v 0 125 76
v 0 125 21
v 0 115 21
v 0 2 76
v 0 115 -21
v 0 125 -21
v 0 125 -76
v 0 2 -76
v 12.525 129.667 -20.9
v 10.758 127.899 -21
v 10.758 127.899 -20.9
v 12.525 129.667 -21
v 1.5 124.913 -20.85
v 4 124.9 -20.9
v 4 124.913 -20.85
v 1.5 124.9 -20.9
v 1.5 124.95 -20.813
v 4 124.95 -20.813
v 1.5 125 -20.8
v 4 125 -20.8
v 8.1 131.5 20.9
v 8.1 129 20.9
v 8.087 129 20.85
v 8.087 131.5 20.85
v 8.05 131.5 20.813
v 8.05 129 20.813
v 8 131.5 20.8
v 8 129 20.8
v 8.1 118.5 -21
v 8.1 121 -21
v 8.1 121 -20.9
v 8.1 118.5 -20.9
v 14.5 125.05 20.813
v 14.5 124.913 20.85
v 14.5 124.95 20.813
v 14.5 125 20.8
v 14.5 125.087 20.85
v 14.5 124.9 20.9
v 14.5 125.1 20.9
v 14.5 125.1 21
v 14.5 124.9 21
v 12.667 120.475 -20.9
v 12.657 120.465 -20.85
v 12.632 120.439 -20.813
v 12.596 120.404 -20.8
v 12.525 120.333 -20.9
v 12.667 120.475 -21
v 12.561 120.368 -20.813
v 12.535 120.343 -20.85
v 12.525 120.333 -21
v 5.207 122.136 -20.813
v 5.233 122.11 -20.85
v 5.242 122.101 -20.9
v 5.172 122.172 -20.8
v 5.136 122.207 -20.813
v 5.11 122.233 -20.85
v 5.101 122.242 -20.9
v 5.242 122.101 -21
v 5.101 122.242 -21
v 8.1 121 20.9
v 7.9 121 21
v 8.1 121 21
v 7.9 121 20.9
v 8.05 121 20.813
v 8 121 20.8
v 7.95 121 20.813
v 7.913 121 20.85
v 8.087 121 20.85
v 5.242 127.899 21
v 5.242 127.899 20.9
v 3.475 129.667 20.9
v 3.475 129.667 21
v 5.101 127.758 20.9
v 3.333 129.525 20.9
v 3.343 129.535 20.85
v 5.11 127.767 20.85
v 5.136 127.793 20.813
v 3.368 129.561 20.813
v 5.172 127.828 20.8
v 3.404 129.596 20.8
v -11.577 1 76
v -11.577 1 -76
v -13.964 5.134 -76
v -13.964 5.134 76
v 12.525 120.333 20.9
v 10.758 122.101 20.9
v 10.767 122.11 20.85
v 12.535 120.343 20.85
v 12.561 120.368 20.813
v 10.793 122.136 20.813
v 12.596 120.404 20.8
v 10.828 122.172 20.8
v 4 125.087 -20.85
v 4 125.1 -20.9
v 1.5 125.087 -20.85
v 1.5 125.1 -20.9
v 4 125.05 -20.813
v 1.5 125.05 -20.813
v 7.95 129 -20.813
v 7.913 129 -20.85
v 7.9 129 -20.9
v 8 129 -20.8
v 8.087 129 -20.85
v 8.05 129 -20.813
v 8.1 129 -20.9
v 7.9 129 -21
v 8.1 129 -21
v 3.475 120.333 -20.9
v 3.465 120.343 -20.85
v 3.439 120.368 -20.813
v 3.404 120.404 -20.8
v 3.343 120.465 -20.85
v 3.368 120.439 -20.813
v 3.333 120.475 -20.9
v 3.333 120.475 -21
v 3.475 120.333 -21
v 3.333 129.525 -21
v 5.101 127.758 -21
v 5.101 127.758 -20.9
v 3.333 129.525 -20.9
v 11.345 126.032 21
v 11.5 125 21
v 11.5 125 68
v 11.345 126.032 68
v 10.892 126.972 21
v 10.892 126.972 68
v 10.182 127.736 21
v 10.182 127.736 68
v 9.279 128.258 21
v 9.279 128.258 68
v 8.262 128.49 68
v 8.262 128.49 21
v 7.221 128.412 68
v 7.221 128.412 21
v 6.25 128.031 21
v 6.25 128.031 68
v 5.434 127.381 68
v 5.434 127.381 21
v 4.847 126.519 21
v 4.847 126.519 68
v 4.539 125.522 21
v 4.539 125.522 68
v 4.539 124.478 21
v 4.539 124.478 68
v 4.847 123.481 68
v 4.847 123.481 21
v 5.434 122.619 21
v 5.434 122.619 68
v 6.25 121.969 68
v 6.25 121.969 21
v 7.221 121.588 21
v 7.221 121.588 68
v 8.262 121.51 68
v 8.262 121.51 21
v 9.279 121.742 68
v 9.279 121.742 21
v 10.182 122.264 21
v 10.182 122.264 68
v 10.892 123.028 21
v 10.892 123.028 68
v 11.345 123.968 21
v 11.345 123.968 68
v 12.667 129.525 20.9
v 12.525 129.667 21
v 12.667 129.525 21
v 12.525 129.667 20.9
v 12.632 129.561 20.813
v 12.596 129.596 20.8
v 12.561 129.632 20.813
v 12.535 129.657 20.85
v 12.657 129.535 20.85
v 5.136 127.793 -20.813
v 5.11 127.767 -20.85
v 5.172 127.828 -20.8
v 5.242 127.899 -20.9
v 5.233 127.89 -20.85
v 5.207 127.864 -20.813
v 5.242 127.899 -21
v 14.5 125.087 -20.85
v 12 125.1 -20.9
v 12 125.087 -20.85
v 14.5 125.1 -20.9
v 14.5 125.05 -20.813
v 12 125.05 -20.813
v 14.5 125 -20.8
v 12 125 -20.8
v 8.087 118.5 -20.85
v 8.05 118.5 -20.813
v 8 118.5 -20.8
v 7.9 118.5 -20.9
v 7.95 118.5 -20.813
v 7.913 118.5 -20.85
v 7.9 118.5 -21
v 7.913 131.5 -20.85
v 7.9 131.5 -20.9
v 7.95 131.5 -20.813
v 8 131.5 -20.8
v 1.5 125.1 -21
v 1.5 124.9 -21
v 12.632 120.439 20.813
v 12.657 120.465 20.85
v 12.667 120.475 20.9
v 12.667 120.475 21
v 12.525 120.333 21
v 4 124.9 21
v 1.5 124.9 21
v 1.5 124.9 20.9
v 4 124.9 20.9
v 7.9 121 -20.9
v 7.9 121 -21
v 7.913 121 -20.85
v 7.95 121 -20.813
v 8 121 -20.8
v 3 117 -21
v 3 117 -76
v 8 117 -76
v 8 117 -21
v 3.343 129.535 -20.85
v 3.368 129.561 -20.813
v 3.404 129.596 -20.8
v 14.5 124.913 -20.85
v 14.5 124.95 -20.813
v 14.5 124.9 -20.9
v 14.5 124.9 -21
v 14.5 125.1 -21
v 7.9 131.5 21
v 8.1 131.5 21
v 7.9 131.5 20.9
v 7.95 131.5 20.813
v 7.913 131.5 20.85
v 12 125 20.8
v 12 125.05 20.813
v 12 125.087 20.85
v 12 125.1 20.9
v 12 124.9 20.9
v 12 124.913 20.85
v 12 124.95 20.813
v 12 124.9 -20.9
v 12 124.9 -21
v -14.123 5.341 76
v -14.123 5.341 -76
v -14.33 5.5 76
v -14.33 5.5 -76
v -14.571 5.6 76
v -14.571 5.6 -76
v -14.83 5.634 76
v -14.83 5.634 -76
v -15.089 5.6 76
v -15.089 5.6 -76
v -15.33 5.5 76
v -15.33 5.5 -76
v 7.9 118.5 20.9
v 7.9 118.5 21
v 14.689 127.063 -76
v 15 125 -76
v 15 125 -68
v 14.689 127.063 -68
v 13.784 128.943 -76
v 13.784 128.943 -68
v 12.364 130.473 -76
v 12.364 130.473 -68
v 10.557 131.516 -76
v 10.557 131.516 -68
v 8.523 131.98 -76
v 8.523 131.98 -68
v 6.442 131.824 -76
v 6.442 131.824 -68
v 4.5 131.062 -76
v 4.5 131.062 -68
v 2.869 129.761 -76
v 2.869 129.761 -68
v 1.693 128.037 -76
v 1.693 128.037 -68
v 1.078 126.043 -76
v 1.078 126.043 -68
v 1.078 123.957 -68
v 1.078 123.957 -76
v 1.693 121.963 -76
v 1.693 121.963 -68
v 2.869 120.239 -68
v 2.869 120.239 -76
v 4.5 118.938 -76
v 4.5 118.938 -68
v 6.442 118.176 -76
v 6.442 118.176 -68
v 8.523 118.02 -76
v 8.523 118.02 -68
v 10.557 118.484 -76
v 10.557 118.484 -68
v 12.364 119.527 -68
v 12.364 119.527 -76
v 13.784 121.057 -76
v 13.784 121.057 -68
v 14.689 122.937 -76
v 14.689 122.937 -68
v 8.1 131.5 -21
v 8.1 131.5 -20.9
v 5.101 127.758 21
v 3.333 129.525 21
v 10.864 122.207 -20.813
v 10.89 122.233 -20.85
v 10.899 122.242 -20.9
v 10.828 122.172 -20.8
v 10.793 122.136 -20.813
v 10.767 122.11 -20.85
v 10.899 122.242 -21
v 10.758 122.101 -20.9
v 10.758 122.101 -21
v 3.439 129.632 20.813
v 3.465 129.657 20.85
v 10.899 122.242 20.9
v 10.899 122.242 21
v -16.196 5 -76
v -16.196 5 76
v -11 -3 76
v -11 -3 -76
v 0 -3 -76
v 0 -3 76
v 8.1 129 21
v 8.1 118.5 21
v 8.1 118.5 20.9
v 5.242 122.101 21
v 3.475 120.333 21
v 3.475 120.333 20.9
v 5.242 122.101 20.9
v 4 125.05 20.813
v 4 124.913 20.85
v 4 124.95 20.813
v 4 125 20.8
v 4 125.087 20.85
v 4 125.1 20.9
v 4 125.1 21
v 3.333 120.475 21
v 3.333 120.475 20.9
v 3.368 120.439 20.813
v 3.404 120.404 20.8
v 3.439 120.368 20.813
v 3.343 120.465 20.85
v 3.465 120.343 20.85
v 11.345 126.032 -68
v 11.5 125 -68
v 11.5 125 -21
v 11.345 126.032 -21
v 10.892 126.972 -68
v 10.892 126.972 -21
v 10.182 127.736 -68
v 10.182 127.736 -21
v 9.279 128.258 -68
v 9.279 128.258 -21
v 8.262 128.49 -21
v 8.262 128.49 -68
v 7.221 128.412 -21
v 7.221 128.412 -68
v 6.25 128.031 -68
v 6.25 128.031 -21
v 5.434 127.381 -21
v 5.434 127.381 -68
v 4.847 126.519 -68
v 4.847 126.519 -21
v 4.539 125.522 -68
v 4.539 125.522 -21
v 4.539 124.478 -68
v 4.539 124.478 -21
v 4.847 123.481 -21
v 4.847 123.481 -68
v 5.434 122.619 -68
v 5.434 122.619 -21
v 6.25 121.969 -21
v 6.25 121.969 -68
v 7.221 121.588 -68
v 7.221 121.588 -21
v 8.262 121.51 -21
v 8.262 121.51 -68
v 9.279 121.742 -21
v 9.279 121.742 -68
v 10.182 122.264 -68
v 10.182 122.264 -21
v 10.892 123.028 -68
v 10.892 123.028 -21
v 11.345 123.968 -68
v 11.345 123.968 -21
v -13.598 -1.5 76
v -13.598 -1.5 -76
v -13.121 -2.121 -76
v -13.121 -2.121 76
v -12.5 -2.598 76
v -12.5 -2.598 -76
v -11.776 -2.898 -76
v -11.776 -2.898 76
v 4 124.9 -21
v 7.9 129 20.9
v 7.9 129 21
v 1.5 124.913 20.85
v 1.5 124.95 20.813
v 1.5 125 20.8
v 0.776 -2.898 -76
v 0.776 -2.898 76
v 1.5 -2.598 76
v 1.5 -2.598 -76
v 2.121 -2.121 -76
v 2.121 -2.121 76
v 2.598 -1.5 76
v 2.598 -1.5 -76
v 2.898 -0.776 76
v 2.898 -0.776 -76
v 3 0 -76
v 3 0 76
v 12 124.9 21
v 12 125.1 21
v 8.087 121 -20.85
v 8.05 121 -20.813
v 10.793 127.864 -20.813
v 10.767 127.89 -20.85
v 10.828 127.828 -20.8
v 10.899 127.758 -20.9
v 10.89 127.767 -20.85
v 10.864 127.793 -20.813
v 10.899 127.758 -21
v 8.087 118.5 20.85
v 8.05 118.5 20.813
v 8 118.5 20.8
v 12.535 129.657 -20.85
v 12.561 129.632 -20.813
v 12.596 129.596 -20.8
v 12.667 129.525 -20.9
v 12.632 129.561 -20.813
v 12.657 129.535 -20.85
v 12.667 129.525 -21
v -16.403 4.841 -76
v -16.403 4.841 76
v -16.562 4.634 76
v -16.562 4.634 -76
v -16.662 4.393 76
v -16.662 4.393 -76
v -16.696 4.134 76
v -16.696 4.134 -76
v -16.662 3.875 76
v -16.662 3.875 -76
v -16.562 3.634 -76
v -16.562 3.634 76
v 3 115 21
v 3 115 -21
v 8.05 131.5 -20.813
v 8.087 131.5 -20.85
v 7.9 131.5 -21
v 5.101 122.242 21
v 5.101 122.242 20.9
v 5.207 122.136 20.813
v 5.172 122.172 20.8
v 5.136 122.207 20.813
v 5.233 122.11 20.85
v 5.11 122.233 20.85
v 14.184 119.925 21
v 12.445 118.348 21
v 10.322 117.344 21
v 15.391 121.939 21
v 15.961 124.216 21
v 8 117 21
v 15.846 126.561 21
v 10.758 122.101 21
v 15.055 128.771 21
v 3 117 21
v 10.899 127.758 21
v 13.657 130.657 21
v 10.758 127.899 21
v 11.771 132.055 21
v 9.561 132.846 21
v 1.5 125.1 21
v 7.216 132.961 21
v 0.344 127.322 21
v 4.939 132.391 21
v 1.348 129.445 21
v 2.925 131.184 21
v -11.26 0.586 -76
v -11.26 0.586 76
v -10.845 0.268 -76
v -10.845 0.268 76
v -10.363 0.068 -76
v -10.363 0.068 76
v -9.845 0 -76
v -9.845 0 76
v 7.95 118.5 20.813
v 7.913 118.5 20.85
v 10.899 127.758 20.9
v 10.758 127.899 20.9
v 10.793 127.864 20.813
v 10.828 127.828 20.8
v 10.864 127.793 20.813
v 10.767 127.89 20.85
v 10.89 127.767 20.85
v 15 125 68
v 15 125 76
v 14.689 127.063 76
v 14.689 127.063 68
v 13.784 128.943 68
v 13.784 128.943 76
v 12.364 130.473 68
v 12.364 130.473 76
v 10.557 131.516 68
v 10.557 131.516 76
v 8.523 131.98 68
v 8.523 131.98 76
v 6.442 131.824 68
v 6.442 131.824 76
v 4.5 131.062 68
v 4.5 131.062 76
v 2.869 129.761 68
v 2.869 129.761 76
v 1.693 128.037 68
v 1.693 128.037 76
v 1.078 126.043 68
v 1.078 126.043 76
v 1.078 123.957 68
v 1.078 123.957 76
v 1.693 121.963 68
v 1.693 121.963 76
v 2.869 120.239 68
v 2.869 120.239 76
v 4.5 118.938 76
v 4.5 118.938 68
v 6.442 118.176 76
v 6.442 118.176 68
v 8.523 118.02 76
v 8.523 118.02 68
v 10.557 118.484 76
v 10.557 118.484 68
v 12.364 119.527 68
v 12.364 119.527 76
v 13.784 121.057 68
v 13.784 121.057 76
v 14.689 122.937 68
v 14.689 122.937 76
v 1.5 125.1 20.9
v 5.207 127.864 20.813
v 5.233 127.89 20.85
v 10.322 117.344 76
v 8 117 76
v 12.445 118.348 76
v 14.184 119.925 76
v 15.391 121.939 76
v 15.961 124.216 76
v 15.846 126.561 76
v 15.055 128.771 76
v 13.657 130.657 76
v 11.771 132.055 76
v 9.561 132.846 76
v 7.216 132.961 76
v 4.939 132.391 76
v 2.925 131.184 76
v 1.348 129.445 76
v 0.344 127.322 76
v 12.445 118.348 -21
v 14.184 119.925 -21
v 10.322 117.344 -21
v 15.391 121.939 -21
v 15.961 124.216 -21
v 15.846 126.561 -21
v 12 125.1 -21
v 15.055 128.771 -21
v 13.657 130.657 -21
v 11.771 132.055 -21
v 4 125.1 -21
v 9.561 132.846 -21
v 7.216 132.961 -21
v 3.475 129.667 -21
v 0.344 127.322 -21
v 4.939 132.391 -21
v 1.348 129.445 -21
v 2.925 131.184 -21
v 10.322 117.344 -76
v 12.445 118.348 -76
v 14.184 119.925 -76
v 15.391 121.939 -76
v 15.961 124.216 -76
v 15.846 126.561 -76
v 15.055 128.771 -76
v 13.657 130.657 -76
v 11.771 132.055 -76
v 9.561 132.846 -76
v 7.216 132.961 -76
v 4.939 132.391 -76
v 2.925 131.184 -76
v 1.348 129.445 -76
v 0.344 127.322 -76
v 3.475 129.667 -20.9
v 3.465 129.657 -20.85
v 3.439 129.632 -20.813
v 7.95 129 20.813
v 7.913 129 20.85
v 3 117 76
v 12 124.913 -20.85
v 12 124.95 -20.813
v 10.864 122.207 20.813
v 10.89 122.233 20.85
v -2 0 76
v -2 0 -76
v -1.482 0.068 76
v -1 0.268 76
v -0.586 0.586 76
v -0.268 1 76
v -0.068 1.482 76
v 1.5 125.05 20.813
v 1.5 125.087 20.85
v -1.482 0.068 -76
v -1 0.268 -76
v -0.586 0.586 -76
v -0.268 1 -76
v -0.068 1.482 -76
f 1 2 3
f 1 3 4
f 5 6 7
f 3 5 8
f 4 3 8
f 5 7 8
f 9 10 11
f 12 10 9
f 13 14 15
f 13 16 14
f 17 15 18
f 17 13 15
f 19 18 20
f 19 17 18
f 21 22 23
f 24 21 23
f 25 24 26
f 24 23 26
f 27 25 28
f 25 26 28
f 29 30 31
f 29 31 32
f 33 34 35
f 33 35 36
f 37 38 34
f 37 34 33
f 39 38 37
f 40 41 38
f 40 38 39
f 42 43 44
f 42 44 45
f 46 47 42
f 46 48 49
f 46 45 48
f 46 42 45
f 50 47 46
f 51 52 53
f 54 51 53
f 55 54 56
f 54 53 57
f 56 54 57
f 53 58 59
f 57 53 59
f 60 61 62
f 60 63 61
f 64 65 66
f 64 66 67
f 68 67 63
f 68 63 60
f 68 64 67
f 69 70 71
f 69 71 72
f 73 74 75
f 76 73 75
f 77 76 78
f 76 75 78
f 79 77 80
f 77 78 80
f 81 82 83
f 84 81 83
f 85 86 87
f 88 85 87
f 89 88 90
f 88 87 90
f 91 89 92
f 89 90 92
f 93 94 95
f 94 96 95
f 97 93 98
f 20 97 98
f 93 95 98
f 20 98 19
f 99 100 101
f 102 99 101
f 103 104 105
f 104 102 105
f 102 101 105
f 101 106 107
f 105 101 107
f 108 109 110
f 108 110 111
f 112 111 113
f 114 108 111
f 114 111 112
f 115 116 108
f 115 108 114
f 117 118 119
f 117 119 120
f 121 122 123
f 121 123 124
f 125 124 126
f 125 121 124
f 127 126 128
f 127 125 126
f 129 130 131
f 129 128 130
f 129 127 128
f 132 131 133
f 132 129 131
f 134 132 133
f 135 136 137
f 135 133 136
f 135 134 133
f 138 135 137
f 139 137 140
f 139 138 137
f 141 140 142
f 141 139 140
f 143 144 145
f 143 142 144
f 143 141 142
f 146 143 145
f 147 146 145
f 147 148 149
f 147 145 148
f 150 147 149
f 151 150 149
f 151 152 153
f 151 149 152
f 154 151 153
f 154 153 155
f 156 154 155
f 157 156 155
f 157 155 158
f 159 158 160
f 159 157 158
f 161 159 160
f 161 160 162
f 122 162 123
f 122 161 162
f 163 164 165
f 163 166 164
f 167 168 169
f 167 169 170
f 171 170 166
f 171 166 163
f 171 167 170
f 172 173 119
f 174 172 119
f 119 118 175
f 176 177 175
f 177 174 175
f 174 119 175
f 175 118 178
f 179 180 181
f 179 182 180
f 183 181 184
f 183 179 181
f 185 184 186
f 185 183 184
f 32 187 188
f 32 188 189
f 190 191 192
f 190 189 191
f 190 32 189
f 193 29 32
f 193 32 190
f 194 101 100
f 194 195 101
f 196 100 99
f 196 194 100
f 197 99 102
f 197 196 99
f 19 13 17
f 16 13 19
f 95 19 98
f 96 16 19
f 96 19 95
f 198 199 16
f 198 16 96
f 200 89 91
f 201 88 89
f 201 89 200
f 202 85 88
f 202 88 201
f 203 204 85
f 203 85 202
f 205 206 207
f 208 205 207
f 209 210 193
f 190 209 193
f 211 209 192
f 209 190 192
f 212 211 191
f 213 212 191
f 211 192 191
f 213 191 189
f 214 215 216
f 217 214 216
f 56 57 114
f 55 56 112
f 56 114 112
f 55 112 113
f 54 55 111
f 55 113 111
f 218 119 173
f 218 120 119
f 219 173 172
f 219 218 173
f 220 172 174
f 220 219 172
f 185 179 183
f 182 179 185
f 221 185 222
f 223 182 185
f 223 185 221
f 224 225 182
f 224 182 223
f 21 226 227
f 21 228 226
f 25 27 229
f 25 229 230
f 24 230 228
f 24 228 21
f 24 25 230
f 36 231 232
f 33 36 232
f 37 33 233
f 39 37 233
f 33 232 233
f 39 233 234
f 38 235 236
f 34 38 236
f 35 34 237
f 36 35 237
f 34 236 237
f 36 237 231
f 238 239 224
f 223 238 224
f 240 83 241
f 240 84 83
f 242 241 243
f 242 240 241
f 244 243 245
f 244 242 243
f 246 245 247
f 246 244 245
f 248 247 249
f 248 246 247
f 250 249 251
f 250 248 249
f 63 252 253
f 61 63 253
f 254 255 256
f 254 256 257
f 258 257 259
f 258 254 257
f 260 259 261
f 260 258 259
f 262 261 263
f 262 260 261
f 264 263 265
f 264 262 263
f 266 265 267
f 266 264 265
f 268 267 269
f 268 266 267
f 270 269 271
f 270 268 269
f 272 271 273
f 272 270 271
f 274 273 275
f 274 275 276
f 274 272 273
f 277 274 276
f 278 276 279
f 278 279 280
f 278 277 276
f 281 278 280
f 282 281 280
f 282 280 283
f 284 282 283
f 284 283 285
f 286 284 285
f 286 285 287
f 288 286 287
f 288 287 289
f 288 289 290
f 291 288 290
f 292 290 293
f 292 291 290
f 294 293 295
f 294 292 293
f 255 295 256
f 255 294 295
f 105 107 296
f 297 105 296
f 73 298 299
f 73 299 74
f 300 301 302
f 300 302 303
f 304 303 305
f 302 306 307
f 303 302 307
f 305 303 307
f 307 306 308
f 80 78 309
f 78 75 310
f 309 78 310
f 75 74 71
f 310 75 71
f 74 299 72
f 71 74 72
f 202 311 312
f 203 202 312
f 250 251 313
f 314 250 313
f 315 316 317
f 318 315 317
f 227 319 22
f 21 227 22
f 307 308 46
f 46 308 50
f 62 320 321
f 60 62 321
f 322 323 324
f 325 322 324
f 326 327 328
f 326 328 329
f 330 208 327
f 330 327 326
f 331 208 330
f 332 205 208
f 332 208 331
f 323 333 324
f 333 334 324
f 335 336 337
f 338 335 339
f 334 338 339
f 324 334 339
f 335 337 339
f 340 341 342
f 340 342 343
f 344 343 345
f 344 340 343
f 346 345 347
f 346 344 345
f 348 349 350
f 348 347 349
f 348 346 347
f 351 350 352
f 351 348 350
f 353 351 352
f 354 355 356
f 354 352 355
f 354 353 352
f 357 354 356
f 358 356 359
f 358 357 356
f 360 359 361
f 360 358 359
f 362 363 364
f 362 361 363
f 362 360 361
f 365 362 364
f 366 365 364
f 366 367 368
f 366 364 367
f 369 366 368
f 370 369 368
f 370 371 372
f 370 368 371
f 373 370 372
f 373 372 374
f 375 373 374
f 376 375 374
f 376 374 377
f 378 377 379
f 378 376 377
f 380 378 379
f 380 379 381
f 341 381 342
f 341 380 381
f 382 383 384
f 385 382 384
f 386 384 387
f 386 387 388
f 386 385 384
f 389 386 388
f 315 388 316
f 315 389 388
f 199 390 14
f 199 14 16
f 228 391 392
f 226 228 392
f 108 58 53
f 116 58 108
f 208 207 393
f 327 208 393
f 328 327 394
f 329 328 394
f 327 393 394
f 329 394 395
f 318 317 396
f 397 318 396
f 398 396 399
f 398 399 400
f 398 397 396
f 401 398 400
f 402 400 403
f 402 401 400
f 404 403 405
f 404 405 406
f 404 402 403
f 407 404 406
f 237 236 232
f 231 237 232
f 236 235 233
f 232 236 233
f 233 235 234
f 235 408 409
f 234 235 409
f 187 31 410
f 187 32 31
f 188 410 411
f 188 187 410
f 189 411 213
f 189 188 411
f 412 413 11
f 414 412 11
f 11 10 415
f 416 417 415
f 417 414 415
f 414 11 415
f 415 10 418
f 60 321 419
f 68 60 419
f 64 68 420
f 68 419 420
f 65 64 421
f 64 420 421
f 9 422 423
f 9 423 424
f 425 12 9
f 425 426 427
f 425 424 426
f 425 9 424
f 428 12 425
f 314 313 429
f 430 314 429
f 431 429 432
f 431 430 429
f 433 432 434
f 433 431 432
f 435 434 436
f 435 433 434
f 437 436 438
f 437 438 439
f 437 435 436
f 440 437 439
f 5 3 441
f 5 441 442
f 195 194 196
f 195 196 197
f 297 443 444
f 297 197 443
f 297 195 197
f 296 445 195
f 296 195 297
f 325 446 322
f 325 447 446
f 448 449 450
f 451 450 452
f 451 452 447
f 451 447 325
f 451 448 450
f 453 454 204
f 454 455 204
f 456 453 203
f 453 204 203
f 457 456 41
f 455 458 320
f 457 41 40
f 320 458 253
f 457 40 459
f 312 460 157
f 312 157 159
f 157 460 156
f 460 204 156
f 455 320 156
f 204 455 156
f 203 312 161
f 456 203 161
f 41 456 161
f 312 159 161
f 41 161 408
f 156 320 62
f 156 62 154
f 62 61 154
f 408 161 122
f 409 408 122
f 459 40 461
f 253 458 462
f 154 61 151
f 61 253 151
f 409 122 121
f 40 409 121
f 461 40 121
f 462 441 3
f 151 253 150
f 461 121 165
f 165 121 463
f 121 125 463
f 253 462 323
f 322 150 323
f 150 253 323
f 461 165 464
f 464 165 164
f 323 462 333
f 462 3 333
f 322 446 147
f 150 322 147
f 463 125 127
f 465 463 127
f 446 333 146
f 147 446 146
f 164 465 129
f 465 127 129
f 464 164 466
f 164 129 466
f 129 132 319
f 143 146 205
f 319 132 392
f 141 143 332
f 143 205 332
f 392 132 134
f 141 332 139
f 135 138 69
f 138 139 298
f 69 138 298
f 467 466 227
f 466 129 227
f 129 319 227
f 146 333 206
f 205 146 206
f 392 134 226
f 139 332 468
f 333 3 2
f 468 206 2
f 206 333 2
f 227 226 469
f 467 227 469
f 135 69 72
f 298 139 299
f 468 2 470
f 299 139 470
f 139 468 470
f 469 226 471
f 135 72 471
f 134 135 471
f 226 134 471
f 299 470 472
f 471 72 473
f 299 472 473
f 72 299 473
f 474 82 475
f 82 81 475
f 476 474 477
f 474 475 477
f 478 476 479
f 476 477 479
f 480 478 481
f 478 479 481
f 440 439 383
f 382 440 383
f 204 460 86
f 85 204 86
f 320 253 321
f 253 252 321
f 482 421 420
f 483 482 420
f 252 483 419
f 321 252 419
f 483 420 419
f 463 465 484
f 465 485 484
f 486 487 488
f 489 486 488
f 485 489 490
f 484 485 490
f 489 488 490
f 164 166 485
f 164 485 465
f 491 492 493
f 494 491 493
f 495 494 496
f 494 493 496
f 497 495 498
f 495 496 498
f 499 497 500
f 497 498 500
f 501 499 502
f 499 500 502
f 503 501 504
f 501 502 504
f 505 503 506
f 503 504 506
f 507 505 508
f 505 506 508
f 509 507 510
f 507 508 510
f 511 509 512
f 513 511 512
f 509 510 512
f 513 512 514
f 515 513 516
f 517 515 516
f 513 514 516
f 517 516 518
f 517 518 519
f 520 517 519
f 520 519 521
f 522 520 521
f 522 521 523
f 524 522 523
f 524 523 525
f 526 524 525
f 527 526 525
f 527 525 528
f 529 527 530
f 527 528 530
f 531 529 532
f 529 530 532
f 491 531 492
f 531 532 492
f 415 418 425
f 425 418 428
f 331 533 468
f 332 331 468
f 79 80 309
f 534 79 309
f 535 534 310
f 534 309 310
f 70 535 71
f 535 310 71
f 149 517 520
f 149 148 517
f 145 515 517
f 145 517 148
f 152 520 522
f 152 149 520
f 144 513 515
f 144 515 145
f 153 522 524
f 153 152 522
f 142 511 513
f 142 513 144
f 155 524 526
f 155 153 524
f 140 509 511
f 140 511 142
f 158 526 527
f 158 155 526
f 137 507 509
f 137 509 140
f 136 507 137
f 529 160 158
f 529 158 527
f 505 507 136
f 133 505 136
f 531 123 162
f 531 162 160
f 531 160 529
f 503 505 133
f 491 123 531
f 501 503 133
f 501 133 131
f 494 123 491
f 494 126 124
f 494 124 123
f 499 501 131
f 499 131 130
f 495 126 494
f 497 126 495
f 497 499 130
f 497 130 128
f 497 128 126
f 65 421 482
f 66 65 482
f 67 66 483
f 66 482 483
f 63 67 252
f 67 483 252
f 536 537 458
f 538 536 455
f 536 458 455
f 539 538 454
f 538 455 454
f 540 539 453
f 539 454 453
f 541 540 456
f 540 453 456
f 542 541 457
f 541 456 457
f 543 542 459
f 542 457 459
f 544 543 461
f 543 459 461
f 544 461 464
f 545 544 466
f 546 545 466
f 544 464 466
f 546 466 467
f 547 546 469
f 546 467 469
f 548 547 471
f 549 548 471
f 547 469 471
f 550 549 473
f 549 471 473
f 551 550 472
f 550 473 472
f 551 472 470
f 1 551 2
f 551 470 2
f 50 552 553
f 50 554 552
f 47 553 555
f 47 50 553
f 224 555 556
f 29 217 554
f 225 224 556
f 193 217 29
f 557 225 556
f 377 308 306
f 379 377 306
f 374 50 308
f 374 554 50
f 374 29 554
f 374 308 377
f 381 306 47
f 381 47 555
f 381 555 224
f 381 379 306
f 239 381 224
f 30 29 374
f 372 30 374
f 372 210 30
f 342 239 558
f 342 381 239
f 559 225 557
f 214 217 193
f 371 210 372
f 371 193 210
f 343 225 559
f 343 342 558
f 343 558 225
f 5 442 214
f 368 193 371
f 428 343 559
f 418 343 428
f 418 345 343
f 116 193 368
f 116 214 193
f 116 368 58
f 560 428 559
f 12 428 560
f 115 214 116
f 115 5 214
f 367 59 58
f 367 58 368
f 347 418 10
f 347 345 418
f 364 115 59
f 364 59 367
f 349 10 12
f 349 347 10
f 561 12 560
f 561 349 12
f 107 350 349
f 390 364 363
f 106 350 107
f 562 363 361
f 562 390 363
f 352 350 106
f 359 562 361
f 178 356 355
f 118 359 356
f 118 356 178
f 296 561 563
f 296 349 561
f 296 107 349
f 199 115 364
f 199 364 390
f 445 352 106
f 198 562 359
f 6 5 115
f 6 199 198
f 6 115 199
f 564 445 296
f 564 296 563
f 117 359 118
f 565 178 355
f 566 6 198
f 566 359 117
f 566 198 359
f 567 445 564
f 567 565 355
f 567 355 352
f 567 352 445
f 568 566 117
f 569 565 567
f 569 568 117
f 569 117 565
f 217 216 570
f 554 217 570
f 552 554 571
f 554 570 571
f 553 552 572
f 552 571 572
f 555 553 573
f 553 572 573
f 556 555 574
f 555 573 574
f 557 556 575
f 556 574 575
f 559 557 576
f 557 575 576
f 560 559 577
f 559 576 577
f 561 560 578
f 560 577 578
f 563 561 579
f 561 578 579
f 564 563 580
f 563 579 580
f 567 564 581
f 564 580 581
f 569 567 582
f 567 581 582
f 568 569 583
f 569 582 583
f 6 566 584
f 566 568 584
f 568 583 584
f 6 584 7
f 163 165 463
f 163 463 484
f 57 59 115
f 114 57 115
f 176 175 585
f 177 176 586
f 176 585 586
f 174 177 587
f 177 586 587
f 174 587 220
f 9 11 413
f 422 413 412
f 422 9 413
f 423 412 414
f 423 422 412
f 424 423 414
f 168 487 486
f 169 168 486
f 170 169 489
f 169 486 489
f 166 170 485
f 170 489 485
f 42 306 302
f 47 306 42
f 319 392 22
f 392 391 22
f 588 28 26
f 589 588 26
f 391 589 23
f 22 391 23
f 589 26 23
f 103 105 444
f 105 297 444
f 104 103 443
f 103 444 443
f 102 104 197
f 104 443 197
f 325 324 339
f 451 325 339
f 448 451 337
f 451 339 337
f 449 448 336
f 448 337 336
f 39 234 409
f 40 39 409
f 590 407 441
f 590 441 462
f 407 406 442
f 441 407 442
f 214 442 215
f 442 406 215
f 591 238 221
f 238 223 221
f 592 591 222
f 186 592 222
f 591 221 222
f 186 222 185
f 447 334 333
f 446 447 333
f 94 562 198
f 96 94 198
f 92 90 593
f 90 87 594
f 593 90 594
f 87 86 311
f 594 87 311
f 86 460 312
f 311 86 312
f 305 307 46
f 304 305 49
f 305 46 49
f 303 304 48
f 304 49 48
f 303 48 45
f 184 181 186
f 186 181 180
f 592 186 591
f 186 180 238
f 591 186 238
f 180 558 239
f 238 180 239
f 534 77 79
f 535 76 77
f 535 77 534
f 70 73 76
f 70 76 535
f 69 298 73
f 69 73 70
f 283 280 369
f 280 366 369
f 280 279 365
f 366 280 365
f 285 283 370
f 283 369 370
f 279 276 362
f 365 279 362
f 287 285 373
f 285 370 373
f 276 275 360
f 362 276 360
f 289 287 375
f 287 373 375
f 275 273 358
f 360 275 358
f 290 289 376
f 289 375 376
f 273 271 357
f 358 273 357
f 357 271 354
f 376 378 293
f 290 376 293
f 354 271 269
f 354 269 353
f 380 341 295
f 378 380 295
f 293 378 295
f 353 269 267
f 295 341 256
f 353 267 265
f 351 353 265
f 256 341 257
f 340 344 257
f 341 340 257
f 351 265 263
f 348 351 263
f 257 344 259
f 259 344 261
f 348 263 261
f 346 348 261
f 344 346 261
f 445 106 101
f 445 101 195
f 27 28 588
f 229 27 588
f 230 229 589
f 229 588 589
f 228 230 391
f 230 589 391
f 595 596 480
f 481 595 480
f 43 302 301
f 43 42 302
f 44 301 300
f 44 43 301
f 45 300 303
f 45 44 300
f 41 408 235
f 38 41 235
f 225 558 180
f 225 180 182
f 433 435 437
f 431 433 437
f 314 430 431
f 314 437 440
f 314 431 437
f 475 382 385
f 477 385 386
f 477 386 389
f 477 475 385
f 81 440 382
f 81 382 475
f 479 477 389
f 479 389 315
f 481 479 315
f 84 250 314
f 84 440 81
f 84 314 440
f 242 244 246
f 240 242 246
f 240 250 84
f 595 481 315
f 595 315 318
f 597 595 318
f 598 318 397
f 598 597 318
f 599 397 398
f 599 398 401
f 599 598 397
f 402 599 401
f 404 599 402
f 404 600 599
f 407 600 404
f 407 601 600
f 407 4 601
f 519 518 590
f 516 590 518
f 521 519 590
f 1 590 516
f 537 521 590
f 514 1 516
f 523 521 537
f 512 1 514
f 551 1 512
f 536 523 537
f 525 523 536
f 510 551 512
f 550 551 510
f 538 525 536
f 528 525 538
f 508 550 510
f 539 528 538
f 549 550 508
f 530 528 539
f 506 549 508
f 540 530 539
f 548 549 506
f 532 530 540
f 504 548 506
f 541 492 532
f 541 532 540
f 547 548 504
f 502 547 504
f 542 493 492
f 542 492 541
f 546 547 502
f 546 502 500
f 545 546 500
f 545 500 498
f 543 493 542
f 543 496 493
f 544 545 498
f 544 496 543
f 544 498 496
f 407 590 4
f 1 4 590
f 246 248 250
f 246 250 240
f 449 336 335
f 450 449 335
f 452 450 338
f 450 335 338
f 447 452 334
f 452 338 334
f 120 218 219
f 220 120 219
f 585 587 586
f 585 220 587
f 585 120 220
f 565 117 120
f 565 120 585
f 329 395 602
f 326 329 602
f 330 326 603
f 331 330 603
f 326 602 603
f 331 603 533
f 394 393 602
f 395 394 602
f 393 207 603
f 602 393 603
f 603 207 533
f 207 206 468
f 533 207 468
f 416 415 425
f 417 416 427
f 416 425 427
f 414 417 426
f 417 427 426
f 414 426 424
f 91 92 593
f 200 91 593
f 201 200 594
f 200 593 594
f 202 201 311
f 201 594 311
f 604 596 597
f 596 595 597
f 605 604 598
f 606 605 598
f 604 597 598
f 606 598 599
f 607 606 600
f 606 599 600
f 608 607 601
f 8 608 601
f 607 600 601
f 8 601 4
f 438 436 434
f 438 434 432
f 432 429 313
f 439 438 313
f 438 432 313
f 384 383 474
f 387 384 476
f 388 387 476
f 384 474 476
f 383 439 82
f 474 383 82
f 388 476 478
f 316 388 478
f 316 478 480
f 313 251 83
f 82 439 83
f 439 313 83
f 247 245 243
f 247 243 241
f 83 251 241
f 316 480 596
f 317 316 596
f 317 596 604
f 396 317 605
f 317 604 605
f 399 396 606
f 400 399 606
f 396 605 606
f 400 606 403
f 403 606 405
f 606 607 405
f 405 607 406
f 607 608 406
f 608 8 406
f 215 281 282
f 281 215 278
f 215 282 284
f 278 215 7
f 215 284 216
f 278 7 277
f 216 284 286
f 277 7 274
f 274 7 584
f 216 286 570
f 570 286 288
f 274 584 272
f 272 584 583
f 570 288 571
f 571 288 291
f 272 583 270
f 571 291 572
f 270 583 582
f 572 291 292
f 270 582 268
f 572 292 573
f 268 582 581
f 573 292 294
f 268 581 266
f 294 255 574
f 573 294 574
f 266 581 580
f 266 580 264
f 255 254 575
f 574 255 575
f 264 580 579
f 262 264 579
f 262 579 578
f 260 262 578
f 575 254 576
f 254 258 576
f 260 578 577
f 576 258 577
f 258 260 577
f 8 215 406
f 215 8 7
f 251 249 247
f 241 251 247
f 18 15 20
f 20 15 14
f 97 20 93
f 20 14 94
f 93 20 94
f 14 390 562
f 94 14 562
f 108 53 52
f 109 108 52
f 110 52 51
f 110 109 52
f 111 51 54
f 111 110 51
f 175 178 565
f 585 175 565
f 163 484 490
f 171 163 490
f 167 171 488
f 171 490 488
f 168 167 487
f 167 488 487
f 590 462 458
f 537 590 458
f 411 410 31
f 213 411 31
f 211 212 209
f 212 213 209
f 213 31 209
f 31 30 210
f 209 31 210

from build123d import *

# Parameters (mm, degrees)
BOSS_EXTRUDE1_DEPTH      = 76
BOSS_EXTRUDE1_DEPTH_BACK = 76
SKETCH2_R                = 8
FILLET1_R                = 3
FILLET2_R                = 2
FILLET3_R                = 1
CUT_EXTRUDE2_DEPTH       = 155.090108397
CUT_EXTRUDE2_DEPTH_BACK  = 155.090108397
SKETCH7_R                = 3.5
SKETCH9_R                = 7
CUT_EXTRUDE3_DEPTH       = 8
CUT_EXTRUDE4_DEPTH       = 155.090108397
CUT_EXTRUDE4_DEPTH_BACK  = 155.090108397
SKETCH10_W               = 42
SKETCH10_H               = 59.343909382
SKETCH11_W               = 0.2
SKETCH11_H               = 2.5
BOSS_EXTRUDE2_DEPTH      = 0.2
FILLET4_R                = 0.1
CIRPATTERN1_COUNT        = 8
FILLET4_OF_CIRPATTERN1_R = 0.1
MIRROR2_START            = 118.5
MIRROR2_DEPTH            = 2.5
MIRROR2_START_2          = 129
MIRROR2_2_DEPTH          = 2.5
MIRROR2_START_3          = 87.545201898
MIRROR2_3_DEPTH          = 2.5
MIRROR2_START_4          = 98.045201898
MIRROR2_4_DEPTH          = 2.5
MIRROR2_START_5          = 1.5
MIRROR2_5_DEPTH          = 2.5
MIRROR2_START_6          = 12
MIRROR2_6_DEPTH          = 2.5
MIRROR2_START_7          = -89.231493399
MIRROR2_7_DEPTH          = 2.5
MIRROR2_START_8          = -78.731493399
MIRROR2_8_DEPTH          = 2.5


# Read off the part's stored shape, not the designer's step: Mirror2
with BuildPart() as part:
    # Sketch2 → Boss-Extrude1 (new, two sides: drawn at the far end of the back side and taken through both)
    with BuildSketch(Plane.XY.offset(-BOSS_EXTRUDE1_DEPTH_BACK)):
        with Locations((8, 125)):
            Circle(SKETCH2_R)
        with BuildLine():
            ThreePointArc((8, 117), (5.350470229, 117.451490744), (3, 118.755002002))
            Line((3, 118.755002002), (3, 117))
            Line((3, 117), (8, 117))
        make_face()
        with BuildLine():
            Line((0, 125), (0, 0))
            Line((0, 0), (-11, 0))
            Line((-11, 0), (-14.464101615, 6))
            Line((-14.464101615, 6), (-17.062177826, 4.5))
            Line((-17.062177826, 4.5), (-12.732050808, -3))
            Line((-12.732050808, -3), (3, -3))
            Line((3, -3), (3, 117))
            Line((3, 117), (3, 118.755002002))
            ThreePointArc((3, 118.755002002), (0.788897449, 121.535898385), (0, 125))
        make_face()
    extrude(amount=BOSS_EXTRUDE1_DEPTH + BOSS_EXTRUDE1_DEPTH_BACK)

    # Fillet1
    fillet1_edges = [part.edges().sort_by_distance(p)[0] for p in [
        (3, -3, 0),
        (-12.732050808, -3, 0),
    ]]
    fillet(fillet1_edges, radius=FILLET1_R)

    # Fillet2
    fillet2_edges = [part.edges().sort_by_distance(p)[0] for p in [
        (-11, 0, 0),
        (0, 0, 0),
    ]]
    fillet(fillet2_edges, radius=FILLET2_R)

    # Fillet3
    fillet3_edges = [part.edges().sort_by_distance(p)[0] for p in [
        (-17.062177826, 4.5, 0),
        (-14.464101615, 6, 0),
    ]]
    fillet(fillet3_edges, radius=FILLET3_R)

    # Sketch7 → Cut-Extrude2 (cut, two sides: drawn at the far end of the back side and taken through both)
    with BuildSketch(Plane.XY.offset(-CUT_EXTRUDE2_DEPTH_BACK)):
        with Locations((8, 125)):
            Circle(SKETCH7_R)
    extrude(amount=CUT_EXTRUDE2_DEPTH + CUT_EXTRUDE2_DEPTH_BACK, mode=Mode.SUBTRACT)

    # Sketch9 → Cut-Extrude3 (cut)
    with BuildSketch(Plane.XY.offset(76)):
        with Locations((8, 125)):
            Circle(SKETCH9_R)
    cut_extrude3 = extrude(amount=-CUT_EXTRUDE3_DEPTH, mode=Mode.SUBTRACT)

    # Mirror1: Cut-Extrude3 across plane
    add(cut_extrude3.mirror(Plane.XY), mode=Mode.SUBTRACT)

    # Sketch10 → Cut-Extrude4 (cut, two sides: drawn at the far end of the back side and taken through both)
    with BuildSketch(Plane(origin=(0, 0, 0), x_dir=(0, 0, -1), z_dir=(1, 0, 0)).offset(-CUT_EXTRUDE4_DEPTH_BACK)):
        with Locations((0, 144.671954691)):
            Rectangle(SKETCH10_W, SKETCH10_H)
    extrude(amount=CUT_EXTRUDE4_DEPTH + CUT_EXTRUDE4_DEPTH_BACK, mode=Mode.SUBTRACT)

    # Sketch11 → Boss-Extrude2 (add)
    with BuildSketch(Plane.XY.offset(-21)):
        with Locations((8, 130.25)):
            Rectangle(SKETCH11_W, SKETCH11_H)
    boss_extrude2 = extrude(amount=BOSS_EXTRUDE2_DEPTH)

    # Fillet4
    fillet4_edges = [part.edges().sort_by_distance(p)[0] for p in [
        (8.1, 130.25, -20.8),
        (7.9, 130.25, -20.8),
    ]]
    fillet(fillet4_edges, radius=FILLET4_R - 0.0001)  # a hair under: the kernel refuses the full size

    # CirPattern1: Boss-Extrude2 ×8 about axis
    cirpattern1_axis = Axis((8, 125, 0), (0, 0, 1))
    for i in range(1, CIRPATTERN1_COUNT):
        add(boss_extrude2.rotate(cirpattern1_axis, i * 360 / CIRPATTERN1_COUNT))

    # Fillet4 of CirPattern1
    fillet4_of_cirpattern1_edges = [part.edges().sort_by_distance(p)[0] for p in [
        (4.358400077, 128.783021279, -20.8),
        (4.216978721, 128.641599923, -20.8),
        (2.75, 125.1, -20.8),
        (2.75, 124.9, -20.8),
        (4.216978721, 121.358400077, -20.8),
        (4.358400077, 121.216978721, -20.8),
        (7.9, 119.75, -20.8),
        (8.1, 119.75, -20.8),
        (11.641599923, 121.216978721, -20.8),
        (11.783021279, 121.358400077, -20.8),
        (13.25, 124.9, -20.8),
        (13.25, 125.1, -20.8),
        (11.783021279, 128.641599923, -20.8),
        (11.641599923, 128.783021279, -20.8),
    ]]
    fillet(fillet4_of_cirpattern1_edges, radius=FILLET4_OF_CIRPATTERN1_R - 0.0001)  # a hair under: the kernel refuses the full size

    # Mirror2 outline → Mirror2 (add)
    with BuildSketch(Plane(origin=(0, 0, 0), x_dir=(1, 0, 0), z_dir=(0, 1, 0)).offset(MIRROR2_START)):
        with BuildLine():
            Line((7.9, -21), (8.1, -21))
            Line((8.1, -21), (8.1, -20.9))
            ThreePointArc((8.1, -20.9), (8.070710678, -20.829289322), (8, -20.8))
            ThreePointArc((8, -20.8), (7.929289322, -20.829289322), (7.9, -20.9))
            Line((7.9, -20.9), (7.9, -21))
        make_face()
    extrude(amount=MIRROR2_DEPTH)

    # Mirror2 2 outline → Mirror2 2 (add)
    with BuildSketch(Plane(origin=(0, 0, 0), x_dir=(1, 0, 0), z_dir=(0, 1, 0)).offset(MIRROR2_START_2)):
        with BuildLine():
            Line((7.9, -21), (8.1, -21))
            Line((8.1, -21), (8.1, -20.9))
            ThreePointArc((8.1, -20.9), (8.070710678, -20.829289322), (8, -20.8))
            ThreePointArc((8, -20.8), (7.929289322, -20.829289322), (7.9, -20.9))
            Line((7.9, -20.9), (7.9, -21))
        make_face()
    extrude(amount=MIRROR2_2_DEPTH)

    # Mirror2 3 outline → Mirror2 3 (add)
    with BuildSketch(Plane(origin=(0, 0, 0), x_dir=(0.7071067811865471, -0.707106781186548, 0), z_dir=(0.707106781186548, 0.707106781186547, 0)).offset(MIRROR2_START_3)):
        with BuildLine():
            Line((-82.831493399, -21), (-82.631493399, -21))
            Line((-82.631493399, -21), (-82.631493399, -20.9))
            ThreePointArc((-82.631493399, -20.9), (-82.660782721, -20.829289322), (-82.731493399, -20.8))
            ThreePointArc((-82.731493399, -20.8), (-82.802204077, -20.829289322), (-82.831493399, -20.9))
            Line((-82.831493399, -20.9), (-82.831493399, -21))
        make_face()
    extrude(amount=MIRROR2_3_DEPTH)

    # Mirror2 4 outline → Mirror2 4 (add)
    with BuildSketch(Plane(origin=(0, 0, 0), x_dir=(0.7071067811865471, -0.707106781186548, 0), z_dir=(0.707106781186548, 0.707106781186547, 0)).offset(MIRROR2_START_4)):
        with BuildLine():
            Line((-82.831493399, -21), (-82.631493399, -21))
            Line((-82.631493399, -21), (-82.631493399, -20.9))
            ThreePointArc((-82.631493399, -20.9), (-82.660782721, -20.829289322), (-82.731493399, -20.8))
            ThreePointArc((-82.731493399, -20.8), (-82.802204077, -20.829289322), (-82.831493399, -20.9))
            Line((-82.831493399, -20.9), (-82.831493399, -21))
        make_face()
    extrude(amount=MIRROR2_4_DEPTH)

    # Mirror2 5 outline → Mirror2 5 (add)
    with BuildSketch(Plane.YZ.offset(MIRROR2_START_5)):
        with BuildLine():
            Line((125.1, 21), (124.9, 21))
            Line((124.9, 21), (124.9, 20.9))
            ThreePointArc((124.9, 20.9), (124.929289322, 20.829289322), (125, 20.8))
            ThreePointArc((125, 20.8), (125.070710678, 20.829289322), (125.1, 20.9))
            Line((125.1, 20.9), (125.1, 21))
        make_face()
    extrude(amount=MIRROR2_5_DEPTH)

    # Mirror2 6 outline → Mirror2 6 (add)
    with BuildSketch(Plane.YZ.offset(MIRROR2_START_6)):
        with BuildLine():
            Line((125.1, 21), (124.9, 21))
            Line((124.9, 21), (124.9, 20.9))
            ThreePointArc((124.9, 20.9), (124.929289322, 20.829289322), (125, 20.8))
            ThreePointArc((125, 20.8), (125.070710678, 20.829289322), (125.1, 20.9))
            Line((125.1, 20.9), (125.1, 21))
        make_face()
    extrude(amount=MIRROR2_6_DEPTH)

    # Mirror2 7 outline → Mirror2 7 (add)
    with BuildSketch(Plane(origin=(0, 0, 0), x_dir=(0.7071067811865509, 0.707106781186544, 0), z_dir=(0.707106781186544, -0.707106781186551, 0)).offset(MIRROR2_START_7)):
        with BuildLine():
            Line((94.145201898, 21), (93.945201898, 21))
            Line((93.945201898, 21), (93.945201898, 20.9))
            ThreePointArc((93.945201898, 20.9), (93.97449122, 20.829289322), (94.045201898, 20.8))
            ThreePointArc((94.045201898, 20.8), (94.115912576, 20.829289322), (94.145201898, 20.9))
            Line((94.145201898, 20.9), (94.145201898, 21))
        make_face()
    extrude(amount=MIRROR2_7_DEPTH)

    # Mirror2 8 outline → Mirror2 8 (add)
    with BuildSketch(Plane(origin=(0, 0, 0), x_dir=(0.7071067811865509, 0.707106781186544, 0), z_dir=(0.707106781186544, -0.707106781186551, 0)).offset(MIRROR2_START_8)):
        with BuildLine():
            Line((94.145201898, 21), (93.945201898, 21))
            Line((93.945201898, 21), (93.945201898, 20.9))
            ThreePointArc((93.945201898, 20.9), (93.97449122, 20.829289322), (94.045201898, 20.8))
            ThreePointArc((94.045201898, 20.8), (94.115912576, 20.829289322), (94.145201898, 20.9))
            Line((94.145201898, 20.9), (94.145201898, 21))
        make_face()
    extrude(amount=MIRROR2_8_DEPTH)


solid = part.part
